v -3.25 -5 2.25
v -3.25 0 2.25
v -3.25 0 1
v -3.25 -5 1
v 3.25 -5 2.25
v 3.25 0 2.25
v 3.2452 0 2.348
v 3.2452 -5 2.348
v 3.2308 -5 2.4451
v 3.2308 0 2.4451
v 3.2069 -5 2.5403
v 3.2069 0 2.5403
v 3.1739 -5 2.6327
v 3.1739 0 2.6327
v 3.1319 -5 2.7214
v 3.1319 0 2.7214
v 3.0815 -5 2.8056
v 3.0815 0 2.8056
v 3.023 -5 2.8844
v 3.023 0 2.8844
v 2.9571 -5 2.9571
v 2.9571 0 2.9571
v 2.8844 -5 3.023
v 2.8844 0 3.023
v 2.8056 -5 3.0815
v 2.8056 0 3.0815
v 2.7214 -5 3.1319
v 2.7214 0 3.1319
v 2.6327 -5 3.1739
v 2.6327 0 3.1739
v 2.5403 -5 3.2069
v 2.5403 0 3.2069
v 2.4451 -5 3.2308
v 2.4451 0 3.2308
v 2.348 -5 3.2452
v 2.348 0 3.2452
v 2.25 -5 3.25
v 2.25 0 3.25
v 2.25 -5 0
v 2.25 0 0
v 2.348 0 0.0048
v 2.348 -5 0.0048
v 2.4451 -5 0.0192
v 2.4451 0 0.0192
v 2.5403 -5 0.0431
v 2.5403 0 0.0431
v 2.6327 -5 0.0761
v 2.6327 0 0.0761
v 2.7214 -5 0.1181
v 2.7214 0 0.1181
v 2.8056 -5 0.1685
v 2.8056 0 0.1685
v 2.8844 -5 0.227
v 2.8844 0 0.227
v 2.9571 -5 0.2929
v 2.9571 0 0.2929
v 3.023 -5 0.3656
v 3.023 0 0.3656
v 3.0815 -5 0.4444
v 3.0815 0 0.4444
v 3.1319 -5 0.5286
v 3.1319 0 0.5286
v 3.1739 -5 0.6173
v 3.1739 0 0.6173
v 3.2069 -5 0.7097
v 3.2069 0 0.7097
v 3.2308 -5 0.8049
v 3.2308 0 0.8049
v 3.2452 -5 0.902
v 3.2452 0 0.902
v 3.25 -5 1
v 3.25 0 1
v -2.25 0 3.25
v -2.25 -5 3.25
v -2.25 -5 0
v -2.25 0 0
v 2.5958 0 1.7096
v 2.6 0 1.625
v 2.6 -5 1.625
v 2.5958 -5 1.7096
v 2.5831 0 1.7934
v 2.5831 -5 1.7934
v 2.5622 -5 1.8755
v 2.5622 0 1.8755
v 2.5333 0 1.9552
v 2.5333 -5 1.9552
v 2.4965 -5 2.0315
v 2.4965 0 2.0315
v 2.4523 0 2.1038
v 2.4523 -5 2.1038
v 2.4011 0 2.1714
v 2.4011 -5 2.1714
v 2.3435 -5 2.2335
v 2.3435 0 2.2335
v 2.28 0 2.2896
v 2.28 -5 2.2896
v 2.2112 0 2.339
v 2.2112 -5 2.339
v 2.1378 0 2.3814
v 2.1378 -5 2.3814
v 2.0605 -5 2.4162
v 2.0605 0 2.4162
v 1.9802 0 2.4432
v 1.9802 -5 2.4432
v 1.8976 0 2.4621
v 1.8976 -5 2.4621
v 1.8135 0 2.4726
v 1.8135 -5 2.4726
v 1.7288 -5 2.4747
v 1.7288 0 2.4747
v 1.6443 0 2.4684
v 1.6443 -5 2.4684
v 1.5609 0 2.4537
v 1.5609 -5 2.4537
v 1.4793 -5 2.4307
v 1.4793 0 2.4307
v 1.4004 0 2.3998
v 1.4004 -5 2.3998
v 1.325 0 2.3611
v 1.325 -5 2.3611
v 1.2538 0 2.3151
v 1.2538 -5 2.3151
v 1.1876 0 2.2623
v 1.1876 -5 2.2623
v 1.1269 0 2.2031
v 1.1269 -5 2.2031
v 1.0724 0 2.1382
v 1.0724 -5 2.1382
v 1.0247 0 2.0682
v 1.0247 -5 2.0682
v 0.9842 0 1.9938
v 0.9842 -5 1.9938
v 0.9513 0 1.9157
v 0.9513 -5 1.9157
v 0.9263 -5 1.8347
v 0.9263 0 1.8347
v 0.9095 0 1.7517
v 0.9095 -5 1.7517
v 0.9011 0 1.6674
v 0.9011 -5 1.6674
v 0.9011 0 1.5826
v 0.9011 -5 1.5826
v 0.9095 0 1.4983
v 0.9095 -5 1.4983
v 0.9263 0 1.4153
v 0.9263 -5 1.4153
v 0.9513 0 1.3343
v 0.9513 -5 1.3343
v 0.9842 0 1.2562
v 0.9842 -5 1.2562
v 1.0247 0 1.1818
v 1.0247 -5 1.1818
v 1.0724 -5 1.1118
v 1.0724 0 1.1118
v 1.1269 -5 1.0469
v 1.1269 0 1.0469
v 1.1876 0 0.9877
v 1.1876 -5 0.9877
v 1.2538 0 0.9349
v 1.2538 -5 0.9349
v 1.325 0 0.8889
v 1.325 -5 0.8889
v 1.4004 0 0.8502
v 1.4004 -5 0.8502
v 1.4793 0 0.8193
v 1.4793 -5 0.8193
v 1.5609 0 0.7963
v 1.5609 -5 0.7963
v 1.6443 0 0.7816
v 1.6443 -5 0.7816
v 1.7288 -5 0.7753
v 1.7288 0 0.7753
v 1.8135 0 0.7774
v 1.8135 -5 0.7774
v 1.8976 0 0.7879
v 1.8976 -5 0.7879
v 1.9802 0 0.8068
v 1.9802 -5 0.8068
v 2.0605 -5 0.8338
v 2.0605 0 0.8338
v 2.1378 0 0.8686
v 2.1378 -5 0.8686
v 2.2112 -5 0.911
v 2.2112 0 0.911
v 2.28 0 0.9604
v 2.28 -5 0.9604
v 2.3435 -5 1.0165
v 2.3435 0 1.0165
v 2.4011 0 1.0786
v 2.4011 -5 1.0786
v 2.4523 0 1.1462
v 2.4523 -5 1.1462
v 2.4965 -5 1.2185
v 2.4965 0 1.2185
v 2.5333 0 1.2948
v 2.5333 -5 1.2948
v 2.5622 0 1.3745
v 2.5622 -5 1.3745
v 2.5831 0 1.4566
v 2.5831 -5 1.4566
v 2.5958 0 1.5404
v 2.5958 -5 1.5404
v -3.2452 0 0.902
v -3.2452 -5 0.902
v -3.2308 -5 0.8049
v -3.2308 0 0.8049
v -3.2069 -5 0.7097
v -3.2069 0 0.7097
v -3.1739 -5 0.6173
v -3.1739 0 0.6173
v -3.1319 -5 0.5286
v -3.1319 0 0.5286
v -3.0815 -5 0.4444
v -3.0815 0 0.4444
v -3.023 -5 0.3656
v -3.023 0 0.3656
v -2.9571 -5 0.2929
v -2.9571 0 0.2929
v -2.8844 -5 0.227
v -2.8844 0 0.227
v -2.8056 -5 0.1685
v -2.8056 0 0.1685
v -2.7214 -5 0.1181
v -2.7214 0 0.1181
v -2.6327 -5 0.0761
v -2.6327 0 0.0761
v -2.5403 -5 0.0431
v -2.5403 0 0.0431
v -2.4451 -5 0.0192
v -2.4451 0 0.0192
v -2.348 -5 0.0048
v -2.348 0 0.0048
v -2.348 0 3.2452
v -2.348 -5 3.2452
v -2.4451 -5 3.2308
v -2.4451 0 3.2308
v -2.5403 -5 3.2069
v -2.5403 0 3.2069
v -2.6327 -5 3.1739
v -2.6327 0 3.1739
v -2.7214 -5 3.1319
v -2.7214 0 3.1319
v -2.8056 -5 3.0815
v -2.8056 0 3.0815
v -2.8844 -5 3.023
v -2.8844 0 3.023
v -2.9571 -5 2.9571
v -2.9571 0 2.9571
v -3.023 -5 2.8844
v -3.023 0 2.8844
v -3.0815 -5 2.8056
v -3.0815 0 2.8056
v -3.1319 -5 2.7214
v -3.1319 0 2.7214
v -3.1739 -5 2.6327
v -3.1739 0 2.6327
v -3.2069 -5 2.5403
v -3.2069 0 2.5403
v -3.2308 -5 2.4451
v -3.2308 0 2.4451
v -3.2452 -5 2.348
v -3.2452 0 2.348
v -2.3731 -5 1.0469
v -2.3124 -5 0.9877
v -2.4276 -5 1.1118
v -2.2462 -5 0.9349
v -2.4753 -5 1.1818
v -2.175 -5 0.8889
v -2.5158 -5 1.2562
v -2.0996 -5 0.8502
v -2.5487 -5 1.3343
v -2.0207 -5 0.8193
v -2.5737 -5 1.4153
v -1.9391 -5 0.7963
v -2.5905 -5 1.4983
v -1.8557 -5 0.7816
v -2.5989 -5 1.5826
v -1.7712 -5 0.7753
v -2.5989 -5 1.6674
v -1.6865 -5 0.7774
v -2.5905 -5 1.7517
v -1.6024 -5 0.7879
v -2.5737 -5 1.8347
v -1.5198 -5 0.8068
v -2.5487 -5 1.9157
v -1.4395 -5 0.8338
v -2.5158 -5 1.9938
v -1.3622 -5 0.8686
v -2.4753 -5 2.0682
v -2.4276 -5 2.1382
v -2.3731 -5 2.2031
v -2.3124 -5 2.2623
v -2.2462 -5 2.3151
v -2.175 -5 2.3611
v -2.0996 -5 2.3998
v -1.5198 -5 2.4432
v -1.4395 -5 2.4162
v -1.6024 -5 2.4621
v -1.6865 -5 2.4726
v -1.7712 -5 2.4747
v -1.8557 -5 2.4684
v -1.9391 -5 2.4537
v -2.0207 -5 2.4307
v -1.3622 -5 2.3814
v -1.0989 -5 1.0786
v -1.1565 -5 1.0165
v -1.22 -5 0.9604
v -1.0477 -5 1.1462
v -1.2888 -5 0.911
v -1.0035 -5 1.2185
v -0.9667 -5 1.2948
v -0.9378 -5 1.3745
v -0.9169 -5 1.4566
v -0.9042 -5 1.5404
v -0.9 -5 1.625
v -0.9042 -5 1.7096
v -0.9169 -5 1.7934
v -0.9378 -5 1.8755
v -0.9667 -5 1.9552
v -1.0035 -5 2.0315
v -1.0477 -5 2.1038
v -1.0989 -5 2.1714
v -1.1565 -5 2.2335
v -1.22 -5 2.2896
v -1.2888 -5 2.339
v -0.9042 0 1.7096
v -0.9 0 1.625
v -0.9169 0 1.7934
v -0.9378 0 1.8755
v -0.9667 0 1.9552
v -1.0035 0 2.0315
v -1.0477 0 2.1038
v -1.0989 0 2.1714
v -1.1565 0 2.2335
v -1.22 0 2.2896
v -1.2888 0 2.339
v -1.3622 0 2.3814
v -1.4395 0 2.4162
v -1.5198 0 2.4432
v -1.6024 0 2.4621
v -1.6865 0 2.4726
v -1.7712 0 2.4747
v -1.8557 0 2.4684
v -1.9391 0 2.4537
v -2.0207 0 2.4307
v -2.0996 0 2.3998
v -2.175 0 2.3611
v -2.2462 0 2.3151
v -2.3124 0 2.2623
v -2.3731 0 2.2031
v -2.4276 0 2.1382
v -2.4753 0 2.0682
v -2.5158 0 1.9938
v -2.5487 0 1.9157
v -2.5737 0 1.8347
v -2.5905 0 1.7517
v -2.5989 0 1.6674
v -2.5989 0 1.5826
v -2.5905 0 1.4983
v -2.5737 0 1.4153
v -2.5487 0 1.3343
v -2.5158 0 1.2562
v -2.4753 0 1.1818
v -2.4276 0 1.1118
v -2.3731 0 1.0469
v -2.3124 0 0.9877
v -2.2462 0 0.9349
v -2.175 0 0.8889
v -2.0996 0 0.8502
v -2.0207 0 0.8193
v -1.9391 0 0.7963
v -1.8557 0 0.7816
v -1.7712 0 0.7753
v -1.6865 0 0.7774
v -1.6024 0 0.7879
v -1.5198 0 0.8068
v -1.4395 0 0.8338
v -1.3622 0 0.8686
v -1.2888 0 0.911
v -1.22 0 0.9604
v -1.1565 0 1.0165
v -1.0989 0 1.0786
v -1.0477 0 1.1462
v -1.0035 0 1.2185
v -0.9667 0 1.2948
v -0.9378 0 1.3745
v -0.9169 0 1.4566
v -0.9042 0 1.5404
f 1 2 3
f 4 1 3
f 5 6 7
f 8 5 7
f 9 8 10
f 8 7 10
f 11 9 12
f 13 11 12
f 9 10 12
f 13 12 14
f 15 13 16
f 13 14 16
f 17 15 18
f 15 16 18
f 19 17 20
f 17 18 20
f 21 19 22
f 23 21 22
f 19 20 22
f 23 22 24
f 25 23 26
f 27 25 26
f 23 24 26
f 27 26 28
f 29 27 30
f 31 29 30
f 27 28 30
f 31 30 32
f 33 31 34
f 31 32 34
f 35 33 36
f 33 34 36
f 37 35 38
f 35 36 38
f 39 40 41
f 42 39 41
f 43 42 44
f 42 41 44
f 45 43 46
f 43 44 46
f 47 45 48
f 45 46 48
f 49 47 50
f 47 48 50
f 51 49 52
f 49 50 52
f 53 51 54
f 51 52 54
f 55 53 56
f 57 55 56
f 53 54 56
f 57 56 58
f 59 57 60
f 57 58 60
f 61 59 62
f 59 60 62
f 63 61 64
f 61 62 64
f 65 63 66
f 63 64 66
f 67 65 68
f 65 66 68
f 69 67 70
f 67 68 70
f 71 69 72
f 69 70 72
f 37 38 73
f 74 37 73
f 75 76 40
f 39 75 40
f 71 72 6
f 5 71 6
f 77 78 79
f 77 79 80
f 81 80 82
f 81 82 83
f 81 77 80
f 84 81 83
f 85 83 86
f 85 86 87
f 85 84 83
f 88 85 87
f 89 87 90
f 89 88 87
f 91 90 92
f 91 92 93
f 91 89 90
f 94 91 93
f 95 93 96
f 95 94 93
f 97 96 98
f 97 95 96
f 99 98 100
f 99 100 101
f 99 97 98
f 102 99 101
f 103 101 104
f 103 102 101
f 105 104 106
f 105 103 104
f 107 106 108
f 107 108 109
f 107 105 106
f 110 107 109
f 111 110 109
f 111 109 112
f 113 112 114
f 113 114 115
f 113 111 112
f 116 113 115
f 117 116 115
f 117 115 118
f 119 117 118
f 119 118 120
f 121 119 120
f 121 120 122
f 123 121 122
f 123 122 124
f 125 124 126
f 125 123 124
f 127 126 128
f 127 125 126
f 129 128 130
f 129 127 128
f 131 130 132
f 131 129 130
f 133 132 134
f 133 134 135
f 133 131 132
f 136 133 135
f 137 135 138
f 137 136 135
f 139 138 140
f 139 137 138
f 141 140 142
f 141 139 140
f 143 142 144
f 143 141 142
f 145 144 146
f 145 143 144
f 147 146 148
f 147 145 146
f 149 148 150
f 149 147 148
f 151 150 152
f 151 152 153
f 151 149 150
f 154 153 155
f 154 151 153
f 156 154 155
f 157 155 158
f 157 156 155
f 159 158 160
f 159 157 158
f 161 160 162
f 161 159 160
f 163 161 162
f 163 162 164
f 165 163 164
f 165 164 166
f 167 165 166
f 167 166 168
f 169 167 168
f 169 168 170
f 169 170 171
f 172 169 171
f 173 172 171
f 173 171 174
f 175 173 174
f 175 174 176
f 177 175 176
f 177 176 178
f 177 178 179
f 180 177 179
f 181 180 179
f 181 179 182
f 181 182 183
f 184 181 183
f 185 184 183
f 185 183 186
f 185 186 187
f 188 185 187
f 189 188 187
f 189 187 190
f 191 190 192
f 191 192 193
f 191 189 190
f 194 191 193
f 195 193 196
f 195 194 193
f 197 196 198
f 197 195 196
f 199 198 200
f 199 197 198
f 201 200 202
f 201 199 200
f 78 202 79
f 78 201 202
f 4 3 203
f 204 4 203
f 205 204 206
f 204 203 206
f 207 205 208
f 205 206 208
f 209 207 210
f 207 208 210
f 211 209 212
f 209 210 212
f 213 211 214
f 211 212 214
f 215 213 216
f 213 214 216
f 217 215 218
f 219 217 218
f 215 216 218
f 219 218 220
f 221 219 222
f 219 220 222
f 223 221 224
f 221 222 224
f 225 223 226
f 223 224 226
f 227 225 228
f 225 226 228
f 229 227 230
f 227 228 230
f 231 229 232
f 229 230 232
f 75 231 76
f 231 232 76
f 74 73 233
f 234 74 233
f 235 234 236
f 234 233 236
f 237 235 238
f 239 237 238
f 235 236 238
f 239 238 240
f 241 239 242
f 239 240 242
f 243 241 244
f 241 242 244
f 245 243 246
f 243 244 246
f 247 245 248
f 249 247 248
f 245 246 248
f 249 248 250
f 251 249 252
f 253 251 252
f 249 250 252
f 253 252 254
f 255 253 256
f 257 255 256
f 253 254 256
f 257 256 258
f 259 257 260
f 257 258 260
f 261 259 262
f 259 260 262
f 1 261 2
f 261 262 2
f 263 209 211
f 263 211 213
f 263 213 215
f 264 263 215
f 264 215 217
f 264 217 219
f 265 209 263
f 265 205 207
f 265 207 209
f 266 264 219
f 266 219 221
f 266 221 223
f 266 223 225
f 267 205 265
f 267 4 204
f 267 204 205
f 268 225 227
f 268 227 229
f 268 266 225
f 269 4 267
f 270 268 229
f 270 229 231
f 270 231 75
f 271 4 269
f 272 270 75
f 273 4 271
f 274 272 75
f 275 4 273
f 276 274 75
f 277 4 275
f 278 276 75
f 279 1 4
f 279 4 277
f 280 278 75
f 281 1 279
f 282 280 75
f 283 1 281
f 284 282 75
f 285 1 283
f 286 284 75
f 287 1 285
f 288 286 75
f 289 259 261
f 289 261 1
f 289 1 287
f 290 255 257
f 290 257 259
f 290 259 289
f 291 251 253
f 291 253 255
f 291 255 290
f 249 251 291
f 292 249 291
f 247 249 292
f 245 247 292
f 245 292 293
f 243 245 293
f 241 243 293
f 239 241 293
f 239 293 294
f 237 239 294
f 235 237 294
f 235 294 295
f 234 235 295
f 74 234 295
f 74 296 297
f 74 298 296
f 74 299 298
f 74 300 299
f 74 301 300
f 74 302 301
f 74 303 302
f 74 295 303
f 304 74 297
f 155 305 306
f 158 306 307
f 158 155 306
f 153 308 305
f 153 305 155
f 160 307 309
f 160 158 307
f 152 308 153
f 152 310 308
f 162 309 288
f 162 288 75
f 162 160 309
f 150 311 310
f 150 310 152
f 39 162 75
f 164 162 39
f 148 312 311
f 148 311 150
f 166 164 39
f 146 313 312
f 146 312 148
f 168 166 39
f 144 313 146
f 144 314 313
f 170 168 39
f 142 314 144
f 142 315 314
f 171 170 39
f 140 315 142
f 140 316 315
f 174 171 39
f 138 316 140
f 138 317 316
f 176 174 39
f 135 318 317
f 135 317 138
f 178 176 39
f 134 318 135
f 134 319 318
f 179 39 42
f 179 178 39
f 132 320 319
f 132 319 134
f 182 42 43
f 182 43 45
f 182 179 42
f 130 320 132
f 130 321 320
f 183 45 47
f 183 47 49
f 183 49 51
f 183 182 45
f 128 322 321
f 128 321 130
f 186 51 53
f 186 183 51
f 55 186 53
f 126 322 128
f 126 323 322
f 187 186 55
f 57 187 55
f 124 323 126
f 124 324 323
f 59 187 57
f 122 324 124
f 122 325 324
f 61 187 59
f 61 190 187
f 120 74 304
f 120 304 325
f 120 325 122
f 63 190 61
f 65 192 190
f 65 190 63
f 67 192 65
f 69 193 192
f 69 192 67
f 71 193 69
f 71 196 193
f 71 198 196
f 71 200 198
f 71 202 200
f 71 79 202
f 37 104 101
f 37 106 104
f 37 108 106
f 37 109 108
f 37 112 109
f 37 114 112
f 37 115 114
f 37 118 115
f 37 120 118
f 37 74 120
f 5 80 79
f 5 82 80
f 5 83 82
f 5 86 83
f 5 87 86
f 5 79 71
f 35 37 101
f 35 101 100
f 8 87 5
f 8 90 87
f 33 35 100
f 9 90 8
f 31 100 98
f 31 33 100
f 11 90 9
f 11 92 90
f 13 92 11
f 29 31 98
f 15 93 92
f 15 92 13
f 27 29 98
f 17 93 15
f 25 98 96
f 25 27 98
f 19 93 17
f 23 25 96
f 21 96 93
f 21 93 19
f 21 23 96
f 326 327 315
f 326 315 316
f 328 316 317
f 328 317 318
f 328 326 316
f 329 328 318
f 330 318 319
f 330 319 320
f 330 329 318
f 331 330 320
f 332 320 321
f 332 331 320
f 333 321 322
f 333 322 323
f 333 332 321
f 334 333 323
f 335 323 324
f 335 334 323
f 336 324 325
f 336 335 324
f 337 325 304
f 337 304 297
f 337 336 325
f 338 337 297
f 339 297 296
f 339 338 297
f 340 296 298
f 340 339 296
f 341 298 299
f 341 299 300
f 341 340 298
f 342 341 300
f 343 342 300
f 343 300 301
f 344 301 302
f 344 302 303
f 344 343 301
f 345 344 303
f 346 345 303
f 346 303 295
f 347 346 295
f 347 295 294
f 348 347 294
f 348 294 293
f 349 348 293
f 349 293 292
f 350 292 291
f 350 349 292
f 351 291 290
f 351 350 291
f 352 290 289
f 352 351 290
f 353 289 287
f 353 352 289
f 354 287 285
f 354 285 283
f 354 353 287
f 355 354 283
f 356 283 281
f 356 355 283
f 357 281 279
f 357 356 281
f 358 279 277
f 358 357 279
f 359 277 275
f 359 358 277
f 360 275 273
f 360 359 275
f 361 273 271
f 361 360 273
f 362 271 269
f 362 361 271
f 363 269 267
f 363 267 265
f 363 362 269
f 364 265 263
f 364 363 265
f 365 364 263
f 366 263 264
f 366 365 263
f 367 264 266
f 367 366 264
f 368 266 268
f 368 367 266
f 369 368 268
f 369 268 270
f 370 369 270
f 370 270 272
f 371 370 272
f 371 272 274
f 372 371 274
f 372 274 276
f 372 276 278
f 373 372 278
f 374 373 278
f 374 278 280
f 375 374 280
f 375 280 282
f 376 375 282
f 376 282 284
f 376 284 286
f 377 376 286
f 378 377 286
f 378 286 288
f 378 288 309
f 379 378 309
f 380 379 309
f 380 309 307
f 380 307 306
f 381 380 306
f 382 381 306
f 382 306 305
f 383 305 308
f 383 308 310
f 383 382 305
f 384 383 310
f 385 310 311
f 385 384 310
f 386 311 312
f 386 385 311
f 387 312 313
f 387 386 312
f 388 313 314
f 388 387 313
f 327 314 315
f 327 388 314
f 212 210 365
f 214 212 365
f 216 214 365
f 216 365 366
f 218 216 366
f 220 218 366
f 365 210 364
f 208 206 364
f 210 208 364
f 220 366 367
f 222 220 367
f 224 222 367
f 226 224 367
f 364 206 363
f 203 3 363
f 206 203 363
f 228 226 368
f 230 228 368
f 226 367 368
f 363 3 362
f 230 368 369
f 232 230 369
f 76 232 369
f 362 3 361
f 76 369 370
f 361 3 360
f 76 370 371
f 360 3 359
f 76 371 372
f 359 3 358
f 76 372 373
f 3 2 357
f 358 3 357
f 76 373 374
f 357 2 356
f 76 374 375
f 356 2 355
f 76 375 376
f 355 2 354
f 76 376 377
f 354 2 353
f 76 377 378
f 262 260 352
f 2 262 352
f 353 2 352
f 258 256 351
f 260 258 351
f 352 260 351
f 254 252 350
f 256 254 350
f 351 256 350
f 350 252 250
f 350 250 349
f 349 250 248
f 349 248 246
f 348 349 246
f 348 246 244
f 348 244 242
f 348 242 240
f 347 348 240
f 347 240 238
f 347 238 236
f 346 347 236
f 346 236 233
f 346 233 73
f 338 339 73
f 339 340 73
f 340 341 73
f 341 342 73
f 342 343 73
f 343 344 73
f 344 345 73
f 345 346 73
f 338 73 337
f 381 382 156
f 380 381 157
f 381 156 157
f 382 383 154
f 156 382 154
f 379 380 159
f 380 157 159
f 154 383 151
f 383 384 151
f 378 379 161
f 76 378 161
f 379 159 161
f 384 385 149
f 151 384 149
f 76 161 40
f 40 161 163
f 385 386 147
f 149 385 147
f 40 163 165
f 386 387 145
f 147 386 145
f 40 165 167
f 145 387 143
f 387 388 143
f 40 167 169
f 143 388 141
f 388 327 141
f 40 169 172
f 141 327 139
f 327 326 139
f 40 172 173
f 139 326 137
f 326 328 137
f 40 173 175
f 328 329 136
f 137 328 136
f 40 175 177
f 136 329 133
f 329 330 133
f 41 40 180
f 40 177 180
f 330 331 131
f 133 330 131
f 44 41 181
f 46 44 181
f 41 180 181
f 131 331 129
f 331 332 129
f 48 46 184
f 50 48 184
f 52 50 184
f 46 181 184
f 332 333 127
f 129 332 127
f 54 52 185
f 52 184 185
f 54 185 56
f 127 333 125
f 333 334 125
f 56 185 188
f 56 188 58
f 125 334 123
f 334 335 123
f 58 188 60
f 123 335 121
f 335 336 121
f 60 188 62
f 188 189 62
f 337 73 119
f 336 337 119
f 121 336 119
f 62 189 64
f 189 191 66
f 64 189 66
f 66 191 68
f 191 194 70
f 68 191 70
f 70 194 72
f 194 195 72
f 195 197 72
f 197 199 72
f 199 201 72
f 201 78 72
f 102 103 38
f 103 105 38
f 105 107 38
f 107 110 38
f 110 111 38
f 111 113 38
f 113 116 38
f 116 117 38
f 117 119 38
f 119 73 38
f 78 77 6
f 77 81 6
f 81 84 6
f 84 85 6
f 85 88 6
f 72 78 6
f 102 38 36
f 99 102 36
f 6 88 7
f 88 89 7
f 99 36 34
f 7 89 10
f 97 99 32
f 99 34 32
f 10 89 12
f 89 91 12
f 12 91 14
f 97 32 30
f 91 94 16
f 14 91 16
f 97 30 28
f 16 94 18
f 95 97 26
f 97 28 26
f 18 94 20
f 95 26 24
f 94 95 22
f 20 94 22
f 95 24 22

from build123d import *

# Parameters (mm, degrees)
F0_R     = 0.85
F1_DEPTH = 5


with BuildPart() as f1:
    # F0 (on Front) → F1 (new body)
    with BuildSketch(Plane.XZ):
        with BuildLine():
            Line((-2.25, 0), (0, 0))
            Line((0, 0), (2.25, 0))
            ThreePointArc((2.25, 0), (2.957107, 0.292893), (3.25, 1))
            Line((3.25, 1), (3.25, 2.25))
            ThreePointArc((3.25, 2.25), (2.957107, 2.957107), (2.25, 3.25))
            Line((2.25, 3.25), (0, 3.25))
            Line((0, 3.25), (-2.25, 3.25))
            ThreePointArc((-2.25, 3.25), (-2.957107, 2.957107), (-3.25, 2.25))
            Line((-3.25, 2.25), (-3.25, 1))
            ThreePointArc((-3.25, 1), (-2.957107, 0.292893), (-2.25, 0))
        make_face()
        with Locations((-1.75, 1.625)):
            Circle(F0_R, mode=Mode.SUBTRACT)
        with Locations((1.75, 1.625)):
            Circle(F0_R, mode=Mode.SUBTRACT)
    extrude(amount=F1_DEPTH)


solid = f1.part
